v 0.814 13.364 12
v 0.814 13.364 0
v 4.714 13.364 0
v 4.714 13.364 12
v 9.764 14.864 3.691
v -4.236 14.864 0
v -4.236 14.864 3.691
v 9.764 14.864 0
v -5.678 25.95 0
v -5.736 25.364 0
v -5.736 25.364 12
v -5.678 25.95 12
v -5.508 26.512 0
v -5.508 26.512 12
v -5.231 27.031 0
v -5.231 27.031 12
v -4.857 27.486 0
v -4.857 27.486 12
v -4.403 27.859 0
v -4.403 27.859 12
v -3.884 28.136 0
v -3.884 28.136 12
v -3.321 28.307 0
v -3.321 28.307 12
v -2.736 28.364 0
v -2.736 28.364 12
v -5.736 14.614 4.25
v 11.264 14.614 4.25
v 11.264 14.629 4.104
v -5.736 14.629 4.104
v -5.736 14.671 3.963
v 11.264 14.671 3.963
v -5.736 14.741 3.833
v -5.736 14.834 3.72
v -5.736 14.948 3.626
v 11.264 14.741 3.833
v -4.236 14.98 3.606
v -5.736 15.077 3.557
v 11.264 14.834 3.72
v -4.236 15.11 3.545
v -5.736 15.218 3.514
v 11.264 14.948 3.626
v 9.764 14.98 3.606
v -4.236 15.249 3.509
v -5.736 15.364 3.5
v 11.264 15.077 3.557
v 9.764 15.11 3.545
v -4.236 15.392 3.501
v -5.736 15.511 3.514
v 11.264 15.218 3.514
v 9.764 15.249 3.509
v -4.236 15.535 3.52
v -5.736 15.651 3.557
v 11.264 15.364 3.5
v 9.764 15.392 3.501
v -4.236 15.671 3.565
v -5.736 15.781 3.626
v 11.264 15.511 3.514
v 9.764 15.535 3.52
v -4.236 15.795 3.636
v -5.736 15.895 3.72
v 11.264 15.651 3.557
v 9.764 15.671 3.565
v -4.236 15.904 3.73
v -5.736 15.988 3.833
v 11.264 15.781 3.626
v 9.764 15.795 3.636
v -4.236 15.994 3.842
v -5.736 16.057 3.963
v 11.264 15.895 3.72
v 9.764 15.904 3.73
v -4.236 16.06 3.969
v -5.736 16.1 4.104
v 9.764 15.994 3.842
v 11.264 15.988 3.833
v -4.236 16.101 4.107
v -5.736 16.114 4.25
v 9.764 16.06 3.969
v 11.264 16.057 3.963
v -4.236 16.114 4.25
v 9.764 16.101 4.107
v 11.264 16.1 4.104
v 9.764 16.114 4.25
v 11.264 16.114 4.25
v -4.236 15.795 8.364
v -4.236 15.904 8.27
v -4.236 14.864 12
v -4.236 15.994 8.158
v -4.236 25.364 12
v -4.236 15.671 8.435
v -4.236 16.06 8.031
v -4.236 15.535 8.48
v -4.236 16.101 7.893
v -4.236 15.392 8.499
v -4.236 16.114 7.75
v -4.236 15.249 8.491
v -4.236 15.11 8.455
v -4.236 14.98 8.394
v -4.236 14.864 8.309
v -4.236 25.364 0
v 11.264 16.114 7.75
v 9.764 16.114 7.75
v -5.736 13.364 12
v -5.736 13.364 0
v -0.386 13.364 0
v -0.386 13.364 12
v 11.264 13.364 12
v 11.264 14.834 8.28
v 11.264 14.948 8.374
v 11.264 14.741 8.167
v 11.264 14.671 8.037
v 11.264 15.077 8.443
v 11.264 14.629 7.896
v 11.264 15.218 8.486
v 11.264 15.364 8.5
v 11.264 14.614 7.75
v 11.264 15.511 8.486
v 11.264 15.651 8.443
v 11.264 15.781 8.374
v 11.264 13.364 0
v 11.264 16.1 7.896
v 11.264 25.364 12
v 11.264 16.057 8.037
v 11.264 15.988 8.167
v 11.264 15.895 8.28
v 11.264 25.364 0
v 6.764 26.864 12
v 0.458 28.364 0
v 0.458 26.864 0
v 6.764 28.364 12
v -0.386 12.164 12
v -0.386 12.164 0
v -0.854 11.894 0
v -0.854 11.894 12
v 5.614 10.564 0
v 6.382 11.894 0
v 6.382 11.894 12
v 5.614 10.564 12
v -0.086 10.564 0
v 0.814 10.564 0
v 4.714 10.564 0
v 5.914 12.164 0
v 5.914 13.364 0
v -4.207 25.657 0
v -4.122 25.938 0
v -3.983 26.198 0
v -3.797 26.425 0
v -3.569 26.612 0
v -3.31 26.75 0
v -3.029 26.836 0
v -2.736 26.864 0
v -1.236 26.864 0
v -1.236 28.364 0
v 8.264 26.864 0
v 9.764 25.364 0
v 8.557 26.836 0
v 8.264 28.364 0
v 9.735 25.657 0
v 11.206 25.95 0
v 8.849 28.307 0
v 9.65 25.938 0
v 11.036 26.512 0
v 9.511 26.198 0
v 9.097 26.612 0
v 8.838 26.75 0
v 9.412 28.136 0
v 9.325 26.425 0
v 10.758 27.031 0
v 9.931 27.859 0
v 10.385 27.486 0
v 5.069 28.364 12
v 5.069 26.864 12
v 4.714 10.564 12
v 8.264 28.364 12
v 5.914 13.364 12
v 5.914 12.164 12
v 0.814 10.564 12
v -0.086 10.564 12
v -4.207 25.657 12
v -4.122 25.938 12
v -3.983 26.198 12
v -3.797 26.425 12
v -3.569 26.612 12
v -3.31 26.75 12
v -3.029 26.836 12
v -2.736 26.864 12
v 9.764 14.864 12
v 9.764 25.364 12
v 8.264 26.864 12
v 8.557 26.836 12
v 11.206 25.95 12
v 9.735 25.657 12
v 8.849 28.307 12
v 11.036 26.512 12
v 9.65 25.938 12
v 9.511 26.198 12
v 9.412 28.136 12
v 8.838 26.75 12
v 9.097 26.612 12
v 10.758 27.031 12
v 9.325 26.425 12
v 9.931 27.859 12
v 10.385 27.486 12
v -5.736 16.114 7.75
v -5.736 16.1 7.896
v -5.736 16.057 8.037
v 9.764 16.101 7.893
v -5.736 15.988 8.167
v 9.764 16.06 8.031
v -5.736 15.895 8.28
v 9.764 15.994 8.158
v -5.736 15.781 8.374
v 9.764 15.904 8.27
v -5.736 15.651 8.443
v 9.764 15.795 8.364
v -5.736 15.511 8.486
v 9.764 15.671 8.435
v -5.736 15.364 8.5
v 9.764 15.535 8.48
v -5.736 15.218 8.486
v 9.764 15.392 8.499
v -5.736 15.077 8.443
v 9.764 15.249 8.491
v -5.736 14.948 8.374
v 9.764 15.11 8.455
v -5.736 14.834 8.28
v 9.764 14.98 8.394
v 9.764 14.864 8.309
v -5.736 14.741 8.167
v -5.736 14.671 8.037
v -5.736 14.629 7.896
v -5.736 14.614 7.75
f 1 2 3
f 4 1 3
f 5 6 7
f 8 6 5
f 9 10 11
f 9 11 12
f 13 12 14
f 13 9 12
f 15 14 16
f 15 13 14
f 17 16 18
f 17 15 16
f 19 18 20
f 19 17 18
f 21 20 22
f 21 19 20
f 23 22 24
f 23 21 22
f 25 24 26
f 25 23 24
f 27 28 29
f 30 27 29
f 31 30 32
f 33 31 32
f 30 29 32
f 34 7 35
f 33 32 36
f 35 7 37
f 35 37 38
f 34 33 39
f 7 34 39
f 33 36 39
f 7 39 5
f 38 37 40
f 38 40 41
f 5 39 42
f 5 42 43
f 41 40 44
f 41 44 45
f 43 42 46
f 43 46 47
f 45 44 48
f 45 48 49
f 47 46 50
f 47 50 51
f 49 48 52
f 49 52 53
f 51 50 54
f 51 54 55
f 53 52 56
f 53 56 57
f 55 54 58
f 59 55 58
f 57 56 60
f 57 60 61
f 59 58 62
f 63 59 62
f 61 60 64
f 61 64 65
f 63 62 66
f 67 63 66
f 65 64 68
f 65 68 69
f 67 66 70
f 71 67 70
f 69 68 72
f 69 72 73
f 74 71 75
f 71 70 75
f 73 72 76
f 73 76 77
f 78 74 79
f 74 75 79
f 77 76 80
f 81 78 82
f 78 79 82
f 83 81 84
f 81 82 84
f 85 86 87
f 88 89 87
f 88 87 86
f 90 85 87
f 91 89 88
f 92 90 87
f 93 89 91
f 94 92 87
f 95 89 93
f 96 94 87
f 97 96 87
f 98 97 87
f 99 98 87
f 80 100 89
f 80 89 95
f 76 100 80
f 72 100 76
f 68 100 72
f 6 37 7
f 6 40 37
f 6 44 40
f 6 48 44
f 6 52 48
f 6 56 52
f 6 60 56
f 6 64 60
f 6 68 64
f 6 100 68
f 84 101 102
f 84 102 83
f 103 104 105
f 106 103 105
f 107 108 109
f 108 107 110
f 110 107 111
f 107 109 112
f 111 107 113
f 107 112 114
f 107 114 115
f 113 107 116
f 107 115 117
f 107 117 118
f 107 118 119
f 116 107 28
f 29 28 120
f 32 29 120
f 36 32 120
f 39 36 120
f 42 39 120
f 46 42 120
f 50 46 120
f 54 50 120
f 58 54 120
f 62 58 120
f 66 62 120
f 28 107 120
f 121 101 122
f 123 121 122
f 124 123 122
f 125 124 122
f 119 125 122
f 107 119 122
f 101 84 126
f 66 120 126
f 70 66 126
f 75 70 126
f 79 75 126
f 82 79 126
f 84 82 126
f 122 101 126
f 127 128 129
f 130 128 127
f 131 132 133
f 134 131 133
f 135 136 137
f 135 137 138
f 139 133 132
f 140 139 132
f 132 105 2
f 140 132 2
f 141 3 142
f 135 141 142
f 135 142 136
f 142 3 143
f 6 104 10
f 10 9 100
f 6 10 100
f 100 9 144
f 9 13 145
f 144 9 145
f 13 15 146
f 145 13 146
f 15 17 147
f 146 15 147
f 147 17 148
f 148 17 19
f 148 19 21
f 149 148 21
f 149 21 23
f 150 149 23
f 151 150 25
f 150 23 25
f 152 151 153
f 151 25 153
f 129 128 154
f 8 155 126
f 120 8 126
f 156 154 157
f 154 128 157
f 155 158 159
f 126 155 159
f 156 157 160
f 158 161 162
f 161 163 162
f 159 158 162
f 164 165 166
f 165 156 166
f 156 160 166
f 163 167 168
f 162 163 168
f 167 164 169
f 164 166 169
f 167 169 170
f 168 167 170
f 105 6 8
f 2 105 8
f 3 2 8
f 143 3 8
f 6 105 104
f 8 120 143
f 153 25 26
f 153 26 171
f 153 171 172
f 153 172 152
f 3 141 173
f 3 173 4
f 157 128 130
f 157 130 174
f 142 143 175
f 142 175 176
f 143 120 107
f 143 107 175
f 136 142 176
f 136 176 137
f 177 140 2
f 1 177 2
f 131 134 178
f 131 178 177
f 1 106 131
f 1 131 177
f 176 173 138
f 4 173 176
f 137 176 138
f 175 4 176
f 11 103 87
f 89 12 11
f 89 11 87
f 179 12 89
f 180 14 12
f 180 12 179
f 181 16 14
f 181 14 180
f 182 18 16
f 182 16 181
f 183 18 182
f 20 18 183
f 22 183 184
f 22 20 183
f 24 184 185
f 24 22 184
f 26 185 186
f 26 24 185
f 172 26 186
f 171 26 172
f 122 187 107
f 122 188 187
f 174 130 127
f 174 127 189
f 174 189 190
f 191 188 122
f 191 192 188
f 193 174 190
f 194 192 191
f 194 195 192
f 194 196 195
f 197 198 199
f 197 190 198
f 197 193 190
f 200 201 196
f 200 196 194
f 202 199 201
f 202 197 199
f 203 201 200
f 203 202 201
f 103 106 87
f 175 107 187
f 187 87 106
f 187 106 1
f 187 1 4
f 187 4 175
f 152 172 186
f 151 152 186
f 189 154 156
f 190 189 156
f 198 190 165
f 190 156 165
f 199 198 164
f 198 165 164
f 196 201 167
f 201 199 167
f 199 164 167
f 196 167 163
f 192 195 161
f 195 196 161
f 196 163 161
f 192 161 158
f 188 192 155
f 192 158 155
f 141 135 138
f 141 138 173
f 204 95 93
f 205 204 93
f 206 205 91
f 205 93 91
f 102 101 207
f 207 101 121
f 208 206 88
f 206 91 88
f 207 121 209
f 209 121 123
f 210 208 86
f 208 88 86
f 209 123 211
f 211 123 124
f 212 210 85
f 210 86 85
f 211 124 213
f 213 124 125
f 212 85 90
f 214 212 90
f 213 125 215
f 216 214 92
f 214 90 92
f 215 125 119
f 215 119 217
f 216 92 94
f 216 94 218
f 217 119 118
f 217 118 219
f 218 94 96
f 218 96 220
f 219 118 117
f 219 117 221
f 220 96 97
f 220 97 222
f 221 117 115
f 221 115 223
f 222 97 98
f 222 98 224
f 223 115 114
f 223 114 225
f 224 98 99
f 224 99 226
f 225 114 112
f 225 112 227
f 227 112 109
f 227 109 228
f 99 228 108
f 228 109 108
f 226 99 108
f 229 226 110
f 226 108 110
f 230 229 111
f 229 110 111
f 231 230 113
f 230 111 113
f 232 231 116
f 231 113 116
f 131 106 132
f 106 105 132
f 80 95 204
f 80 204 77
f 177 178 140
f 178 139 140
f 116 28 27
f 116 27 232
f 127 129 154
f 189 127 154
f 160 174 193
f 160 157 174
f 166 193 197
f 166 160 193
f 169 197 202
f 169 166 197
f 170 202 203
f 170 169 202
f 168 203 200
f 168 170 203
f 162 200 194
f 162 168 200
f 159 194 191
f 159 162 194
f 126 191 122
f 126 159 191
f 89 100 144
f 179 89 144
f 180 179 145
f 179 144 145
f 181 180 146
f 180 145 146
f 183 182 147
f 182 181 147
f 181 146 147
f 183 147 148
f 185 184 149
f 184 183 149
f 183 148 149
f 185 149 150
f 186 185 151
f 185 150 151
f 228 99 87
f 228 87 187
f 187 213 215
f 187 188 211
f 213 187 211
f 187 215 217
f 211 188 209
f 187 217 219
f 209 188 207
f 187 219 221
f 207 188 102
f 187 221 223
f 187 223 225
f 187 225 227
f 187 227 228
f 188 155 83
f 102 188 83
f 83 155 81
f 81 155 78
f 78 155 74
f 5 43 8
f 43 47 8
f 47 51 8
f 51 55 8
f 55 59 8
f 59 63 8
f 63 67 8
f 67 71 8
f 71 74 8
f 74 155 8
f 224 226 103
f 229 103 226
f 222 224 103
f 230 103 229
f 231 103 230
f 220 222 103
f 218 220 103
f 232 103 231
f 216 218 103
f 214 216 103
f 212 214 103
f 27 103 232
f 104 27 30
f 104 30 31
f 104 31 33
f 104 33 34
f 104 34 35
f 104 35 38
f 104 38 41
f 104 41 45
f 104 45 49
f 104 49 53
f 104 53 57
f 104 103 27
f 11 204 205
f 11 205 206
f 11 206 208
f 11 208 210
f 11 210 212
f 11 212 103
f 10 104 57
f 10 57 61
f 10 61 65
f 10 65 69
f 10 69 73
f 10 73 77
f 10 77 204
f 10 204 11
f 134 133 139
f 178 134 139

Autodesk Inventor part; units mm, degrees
ref_plane "YZ Plane" through (0, 0, 0) normal (1, 0, 0) x (0, 1, 0)
ref_plane "XZ Plane" through (0, 0, 0) normal (0, 1, 0) x (-1, 0, 0)
ref_plane "XY Plane" through (0, 0, 0) normal (0, 0, 1) x (1, 0, 0)
sketch "Sketch1" plane through (0, 0, 0) normal (0, 0, 1) x (1, 0, 0)
  line L0 (-0.3861, 13.3644) -> (-0.3861, 12.1644)
  line L1 (0.8139, 10.5644) -> (0.8139, 13.3644)
  line L2 (2.7639, 27.7657) -> (2.7639, 5.268) construction
  line L3 (-5.7361, 13.3644) -> (-5.7361, 25.3644)
  line L4 (-2.7361, 28.3644) -> (2.7639, 28.3644)
  line L5 (2.7639, 26.8644) -> (-2.7361, 26.8644)
  line L6 (-4.2361, 25.3644) -> (-4.2361, 14.8644)
  line L7 (-4.2361, 14.8644) -> (2.7639, 14.8644)
  line L8 (-0.3861, 12.1644) -> (-0.8539, 11.8943)
  line L9 (-5.7361, 13.3644) -> (-0.3861, 13.3644)
  arc A0 (-2.7361, 28.3644) -> (-5.7361, 25.3644) centre (-2.7361, 25.3644) ccw
  arc A1 (-2.7361, 26.8644) -> (-4.2361, 25.3644) centre (-2.7361, 25.3644) ccw
  line L10 (-0.8539, 11.8943) -> (-0.0861, 10.5644)
  line L11 (-0.0861, 10.5644) -> (0.8139, 10.5644)
  line L12 (5.6139, 10.5644) -> (4.7139, 10.5644)
  line L13 (11.2639, 13.3644) -> (11.2639, 25.3644)
  arc A2 (11.2639, 25.3644) -> (8.2639, 28.3644) centre (8.2639, 25.3644) ccw
  line L14 (8.2639, 28.3644) -> (2.7639, 28.3644)
  line L15 (2.7639, 26.8644) -> (8.2639, 26.8644)
  arc A3 (9.7639, 25.3644) -> (8.2639, 26.8644) centre (8.2639, 25.3644) ccw
  line L16 (9.7639, 25.3644) -> (9.7639, 14.8644)
  line L17 (9.7639, 14.8644) -> (2.7639, 14.8644)
  line L18 (11.2639, 13.3644) -> (5.9139, 13.3644)
  line L19 (5.9139, 13.3644) -> (5.9139, 12.1644)
  line L20 (5.9139, 13.3644) -> (6.9559, 13.3644)
  line L21 (4.7139, 10.5644) -> (4.7139, 13.3644)
  line L22 (6.3817, 11.8943) -> (5.6139, 10.5644)
  line L23 (5.9139, 12.1644) -> (6.3817, 11.8943)
  line L24 (0.8139, 13.3644) -> (4.7139, 13.3644)
  line L25 (5.9139, 13.3644) -> (6.9559, 13.3644)
  point P0 (0, 0)
  dimension "d1" = 1.2
  dimension "d2" = 1.95
  dimension "d3" = 120
  dimension "d5" = 8.5
  dimension "d6" = 1.5
  dimension "d8" = 1.5
  dimension "d9" = 12
  dimension "d10" = 3
  dimension "d11" = 1.5
  dimension "d12" = 0.9
  dimension "d13" = 120
  dimension "d15" = 1.2
  dimension "d16" = 2.8
  dimension "d17" = 1.5
extrude "Extrusion1" add sketch "Sketch1" along normal blind 12
sketch "Sketch2" plane through (-2.7361, 28.3644, 0) normal (0, 1, 0) x (1, 0, 0)
  line L0 (0, -12) -> (11, -12) projected
  line L1 (11, 0) -> (0, 0) projected
  line L2 (0, 0) -> (0, -12) projected
  line L3 (1.5, 0) -> (3.1945, 0)
  line L4 (3.1945, 0) -> (9.5, -12)
  line L5 (7.8055, -12) -> (1.5, 0)
  point P0 (2.7361, 0)
  dimension "d20" = 1.5
  dimension "d21" = 1.5
  dimension "d22" = 1.5
extrude "Extrusion2" cut sketch "Sketch2" against normal up to next contours L5 L1 L4 L0
sketch "Sketch3" plane through (11.2639, 13.3644, 0) normal (1, 0, 0) x (0, 0, -1)
  line L0 (-12, 12) -> (-12, 0) projected
  line L1 (0, 0) -> (-12, 0) projected
  arc A0 (-7.75, 2.75) -> (-7.75, 1.25) centre (-7.75, 2) ccw
  arc A1 (-4.25, 1.25) -> (-4.25, 2.75) centre (-4.25, 2) ccw
  line L2 (-7.75, 2.75) -> (-4.25, 2.75)
  line L3 (-4.25, 1.25) -> (-7.75, 1.25)
  point P0 (0, -13.3644)
  dimension "d30" = 1.5
  dimension "d31" = 3.5
  dimension "d32" = 4.25
  dimension "d33" = 2
extrude "Extrusion3" cut sketch "Sketch3" against normal through all
properties part number "Cable V3"
